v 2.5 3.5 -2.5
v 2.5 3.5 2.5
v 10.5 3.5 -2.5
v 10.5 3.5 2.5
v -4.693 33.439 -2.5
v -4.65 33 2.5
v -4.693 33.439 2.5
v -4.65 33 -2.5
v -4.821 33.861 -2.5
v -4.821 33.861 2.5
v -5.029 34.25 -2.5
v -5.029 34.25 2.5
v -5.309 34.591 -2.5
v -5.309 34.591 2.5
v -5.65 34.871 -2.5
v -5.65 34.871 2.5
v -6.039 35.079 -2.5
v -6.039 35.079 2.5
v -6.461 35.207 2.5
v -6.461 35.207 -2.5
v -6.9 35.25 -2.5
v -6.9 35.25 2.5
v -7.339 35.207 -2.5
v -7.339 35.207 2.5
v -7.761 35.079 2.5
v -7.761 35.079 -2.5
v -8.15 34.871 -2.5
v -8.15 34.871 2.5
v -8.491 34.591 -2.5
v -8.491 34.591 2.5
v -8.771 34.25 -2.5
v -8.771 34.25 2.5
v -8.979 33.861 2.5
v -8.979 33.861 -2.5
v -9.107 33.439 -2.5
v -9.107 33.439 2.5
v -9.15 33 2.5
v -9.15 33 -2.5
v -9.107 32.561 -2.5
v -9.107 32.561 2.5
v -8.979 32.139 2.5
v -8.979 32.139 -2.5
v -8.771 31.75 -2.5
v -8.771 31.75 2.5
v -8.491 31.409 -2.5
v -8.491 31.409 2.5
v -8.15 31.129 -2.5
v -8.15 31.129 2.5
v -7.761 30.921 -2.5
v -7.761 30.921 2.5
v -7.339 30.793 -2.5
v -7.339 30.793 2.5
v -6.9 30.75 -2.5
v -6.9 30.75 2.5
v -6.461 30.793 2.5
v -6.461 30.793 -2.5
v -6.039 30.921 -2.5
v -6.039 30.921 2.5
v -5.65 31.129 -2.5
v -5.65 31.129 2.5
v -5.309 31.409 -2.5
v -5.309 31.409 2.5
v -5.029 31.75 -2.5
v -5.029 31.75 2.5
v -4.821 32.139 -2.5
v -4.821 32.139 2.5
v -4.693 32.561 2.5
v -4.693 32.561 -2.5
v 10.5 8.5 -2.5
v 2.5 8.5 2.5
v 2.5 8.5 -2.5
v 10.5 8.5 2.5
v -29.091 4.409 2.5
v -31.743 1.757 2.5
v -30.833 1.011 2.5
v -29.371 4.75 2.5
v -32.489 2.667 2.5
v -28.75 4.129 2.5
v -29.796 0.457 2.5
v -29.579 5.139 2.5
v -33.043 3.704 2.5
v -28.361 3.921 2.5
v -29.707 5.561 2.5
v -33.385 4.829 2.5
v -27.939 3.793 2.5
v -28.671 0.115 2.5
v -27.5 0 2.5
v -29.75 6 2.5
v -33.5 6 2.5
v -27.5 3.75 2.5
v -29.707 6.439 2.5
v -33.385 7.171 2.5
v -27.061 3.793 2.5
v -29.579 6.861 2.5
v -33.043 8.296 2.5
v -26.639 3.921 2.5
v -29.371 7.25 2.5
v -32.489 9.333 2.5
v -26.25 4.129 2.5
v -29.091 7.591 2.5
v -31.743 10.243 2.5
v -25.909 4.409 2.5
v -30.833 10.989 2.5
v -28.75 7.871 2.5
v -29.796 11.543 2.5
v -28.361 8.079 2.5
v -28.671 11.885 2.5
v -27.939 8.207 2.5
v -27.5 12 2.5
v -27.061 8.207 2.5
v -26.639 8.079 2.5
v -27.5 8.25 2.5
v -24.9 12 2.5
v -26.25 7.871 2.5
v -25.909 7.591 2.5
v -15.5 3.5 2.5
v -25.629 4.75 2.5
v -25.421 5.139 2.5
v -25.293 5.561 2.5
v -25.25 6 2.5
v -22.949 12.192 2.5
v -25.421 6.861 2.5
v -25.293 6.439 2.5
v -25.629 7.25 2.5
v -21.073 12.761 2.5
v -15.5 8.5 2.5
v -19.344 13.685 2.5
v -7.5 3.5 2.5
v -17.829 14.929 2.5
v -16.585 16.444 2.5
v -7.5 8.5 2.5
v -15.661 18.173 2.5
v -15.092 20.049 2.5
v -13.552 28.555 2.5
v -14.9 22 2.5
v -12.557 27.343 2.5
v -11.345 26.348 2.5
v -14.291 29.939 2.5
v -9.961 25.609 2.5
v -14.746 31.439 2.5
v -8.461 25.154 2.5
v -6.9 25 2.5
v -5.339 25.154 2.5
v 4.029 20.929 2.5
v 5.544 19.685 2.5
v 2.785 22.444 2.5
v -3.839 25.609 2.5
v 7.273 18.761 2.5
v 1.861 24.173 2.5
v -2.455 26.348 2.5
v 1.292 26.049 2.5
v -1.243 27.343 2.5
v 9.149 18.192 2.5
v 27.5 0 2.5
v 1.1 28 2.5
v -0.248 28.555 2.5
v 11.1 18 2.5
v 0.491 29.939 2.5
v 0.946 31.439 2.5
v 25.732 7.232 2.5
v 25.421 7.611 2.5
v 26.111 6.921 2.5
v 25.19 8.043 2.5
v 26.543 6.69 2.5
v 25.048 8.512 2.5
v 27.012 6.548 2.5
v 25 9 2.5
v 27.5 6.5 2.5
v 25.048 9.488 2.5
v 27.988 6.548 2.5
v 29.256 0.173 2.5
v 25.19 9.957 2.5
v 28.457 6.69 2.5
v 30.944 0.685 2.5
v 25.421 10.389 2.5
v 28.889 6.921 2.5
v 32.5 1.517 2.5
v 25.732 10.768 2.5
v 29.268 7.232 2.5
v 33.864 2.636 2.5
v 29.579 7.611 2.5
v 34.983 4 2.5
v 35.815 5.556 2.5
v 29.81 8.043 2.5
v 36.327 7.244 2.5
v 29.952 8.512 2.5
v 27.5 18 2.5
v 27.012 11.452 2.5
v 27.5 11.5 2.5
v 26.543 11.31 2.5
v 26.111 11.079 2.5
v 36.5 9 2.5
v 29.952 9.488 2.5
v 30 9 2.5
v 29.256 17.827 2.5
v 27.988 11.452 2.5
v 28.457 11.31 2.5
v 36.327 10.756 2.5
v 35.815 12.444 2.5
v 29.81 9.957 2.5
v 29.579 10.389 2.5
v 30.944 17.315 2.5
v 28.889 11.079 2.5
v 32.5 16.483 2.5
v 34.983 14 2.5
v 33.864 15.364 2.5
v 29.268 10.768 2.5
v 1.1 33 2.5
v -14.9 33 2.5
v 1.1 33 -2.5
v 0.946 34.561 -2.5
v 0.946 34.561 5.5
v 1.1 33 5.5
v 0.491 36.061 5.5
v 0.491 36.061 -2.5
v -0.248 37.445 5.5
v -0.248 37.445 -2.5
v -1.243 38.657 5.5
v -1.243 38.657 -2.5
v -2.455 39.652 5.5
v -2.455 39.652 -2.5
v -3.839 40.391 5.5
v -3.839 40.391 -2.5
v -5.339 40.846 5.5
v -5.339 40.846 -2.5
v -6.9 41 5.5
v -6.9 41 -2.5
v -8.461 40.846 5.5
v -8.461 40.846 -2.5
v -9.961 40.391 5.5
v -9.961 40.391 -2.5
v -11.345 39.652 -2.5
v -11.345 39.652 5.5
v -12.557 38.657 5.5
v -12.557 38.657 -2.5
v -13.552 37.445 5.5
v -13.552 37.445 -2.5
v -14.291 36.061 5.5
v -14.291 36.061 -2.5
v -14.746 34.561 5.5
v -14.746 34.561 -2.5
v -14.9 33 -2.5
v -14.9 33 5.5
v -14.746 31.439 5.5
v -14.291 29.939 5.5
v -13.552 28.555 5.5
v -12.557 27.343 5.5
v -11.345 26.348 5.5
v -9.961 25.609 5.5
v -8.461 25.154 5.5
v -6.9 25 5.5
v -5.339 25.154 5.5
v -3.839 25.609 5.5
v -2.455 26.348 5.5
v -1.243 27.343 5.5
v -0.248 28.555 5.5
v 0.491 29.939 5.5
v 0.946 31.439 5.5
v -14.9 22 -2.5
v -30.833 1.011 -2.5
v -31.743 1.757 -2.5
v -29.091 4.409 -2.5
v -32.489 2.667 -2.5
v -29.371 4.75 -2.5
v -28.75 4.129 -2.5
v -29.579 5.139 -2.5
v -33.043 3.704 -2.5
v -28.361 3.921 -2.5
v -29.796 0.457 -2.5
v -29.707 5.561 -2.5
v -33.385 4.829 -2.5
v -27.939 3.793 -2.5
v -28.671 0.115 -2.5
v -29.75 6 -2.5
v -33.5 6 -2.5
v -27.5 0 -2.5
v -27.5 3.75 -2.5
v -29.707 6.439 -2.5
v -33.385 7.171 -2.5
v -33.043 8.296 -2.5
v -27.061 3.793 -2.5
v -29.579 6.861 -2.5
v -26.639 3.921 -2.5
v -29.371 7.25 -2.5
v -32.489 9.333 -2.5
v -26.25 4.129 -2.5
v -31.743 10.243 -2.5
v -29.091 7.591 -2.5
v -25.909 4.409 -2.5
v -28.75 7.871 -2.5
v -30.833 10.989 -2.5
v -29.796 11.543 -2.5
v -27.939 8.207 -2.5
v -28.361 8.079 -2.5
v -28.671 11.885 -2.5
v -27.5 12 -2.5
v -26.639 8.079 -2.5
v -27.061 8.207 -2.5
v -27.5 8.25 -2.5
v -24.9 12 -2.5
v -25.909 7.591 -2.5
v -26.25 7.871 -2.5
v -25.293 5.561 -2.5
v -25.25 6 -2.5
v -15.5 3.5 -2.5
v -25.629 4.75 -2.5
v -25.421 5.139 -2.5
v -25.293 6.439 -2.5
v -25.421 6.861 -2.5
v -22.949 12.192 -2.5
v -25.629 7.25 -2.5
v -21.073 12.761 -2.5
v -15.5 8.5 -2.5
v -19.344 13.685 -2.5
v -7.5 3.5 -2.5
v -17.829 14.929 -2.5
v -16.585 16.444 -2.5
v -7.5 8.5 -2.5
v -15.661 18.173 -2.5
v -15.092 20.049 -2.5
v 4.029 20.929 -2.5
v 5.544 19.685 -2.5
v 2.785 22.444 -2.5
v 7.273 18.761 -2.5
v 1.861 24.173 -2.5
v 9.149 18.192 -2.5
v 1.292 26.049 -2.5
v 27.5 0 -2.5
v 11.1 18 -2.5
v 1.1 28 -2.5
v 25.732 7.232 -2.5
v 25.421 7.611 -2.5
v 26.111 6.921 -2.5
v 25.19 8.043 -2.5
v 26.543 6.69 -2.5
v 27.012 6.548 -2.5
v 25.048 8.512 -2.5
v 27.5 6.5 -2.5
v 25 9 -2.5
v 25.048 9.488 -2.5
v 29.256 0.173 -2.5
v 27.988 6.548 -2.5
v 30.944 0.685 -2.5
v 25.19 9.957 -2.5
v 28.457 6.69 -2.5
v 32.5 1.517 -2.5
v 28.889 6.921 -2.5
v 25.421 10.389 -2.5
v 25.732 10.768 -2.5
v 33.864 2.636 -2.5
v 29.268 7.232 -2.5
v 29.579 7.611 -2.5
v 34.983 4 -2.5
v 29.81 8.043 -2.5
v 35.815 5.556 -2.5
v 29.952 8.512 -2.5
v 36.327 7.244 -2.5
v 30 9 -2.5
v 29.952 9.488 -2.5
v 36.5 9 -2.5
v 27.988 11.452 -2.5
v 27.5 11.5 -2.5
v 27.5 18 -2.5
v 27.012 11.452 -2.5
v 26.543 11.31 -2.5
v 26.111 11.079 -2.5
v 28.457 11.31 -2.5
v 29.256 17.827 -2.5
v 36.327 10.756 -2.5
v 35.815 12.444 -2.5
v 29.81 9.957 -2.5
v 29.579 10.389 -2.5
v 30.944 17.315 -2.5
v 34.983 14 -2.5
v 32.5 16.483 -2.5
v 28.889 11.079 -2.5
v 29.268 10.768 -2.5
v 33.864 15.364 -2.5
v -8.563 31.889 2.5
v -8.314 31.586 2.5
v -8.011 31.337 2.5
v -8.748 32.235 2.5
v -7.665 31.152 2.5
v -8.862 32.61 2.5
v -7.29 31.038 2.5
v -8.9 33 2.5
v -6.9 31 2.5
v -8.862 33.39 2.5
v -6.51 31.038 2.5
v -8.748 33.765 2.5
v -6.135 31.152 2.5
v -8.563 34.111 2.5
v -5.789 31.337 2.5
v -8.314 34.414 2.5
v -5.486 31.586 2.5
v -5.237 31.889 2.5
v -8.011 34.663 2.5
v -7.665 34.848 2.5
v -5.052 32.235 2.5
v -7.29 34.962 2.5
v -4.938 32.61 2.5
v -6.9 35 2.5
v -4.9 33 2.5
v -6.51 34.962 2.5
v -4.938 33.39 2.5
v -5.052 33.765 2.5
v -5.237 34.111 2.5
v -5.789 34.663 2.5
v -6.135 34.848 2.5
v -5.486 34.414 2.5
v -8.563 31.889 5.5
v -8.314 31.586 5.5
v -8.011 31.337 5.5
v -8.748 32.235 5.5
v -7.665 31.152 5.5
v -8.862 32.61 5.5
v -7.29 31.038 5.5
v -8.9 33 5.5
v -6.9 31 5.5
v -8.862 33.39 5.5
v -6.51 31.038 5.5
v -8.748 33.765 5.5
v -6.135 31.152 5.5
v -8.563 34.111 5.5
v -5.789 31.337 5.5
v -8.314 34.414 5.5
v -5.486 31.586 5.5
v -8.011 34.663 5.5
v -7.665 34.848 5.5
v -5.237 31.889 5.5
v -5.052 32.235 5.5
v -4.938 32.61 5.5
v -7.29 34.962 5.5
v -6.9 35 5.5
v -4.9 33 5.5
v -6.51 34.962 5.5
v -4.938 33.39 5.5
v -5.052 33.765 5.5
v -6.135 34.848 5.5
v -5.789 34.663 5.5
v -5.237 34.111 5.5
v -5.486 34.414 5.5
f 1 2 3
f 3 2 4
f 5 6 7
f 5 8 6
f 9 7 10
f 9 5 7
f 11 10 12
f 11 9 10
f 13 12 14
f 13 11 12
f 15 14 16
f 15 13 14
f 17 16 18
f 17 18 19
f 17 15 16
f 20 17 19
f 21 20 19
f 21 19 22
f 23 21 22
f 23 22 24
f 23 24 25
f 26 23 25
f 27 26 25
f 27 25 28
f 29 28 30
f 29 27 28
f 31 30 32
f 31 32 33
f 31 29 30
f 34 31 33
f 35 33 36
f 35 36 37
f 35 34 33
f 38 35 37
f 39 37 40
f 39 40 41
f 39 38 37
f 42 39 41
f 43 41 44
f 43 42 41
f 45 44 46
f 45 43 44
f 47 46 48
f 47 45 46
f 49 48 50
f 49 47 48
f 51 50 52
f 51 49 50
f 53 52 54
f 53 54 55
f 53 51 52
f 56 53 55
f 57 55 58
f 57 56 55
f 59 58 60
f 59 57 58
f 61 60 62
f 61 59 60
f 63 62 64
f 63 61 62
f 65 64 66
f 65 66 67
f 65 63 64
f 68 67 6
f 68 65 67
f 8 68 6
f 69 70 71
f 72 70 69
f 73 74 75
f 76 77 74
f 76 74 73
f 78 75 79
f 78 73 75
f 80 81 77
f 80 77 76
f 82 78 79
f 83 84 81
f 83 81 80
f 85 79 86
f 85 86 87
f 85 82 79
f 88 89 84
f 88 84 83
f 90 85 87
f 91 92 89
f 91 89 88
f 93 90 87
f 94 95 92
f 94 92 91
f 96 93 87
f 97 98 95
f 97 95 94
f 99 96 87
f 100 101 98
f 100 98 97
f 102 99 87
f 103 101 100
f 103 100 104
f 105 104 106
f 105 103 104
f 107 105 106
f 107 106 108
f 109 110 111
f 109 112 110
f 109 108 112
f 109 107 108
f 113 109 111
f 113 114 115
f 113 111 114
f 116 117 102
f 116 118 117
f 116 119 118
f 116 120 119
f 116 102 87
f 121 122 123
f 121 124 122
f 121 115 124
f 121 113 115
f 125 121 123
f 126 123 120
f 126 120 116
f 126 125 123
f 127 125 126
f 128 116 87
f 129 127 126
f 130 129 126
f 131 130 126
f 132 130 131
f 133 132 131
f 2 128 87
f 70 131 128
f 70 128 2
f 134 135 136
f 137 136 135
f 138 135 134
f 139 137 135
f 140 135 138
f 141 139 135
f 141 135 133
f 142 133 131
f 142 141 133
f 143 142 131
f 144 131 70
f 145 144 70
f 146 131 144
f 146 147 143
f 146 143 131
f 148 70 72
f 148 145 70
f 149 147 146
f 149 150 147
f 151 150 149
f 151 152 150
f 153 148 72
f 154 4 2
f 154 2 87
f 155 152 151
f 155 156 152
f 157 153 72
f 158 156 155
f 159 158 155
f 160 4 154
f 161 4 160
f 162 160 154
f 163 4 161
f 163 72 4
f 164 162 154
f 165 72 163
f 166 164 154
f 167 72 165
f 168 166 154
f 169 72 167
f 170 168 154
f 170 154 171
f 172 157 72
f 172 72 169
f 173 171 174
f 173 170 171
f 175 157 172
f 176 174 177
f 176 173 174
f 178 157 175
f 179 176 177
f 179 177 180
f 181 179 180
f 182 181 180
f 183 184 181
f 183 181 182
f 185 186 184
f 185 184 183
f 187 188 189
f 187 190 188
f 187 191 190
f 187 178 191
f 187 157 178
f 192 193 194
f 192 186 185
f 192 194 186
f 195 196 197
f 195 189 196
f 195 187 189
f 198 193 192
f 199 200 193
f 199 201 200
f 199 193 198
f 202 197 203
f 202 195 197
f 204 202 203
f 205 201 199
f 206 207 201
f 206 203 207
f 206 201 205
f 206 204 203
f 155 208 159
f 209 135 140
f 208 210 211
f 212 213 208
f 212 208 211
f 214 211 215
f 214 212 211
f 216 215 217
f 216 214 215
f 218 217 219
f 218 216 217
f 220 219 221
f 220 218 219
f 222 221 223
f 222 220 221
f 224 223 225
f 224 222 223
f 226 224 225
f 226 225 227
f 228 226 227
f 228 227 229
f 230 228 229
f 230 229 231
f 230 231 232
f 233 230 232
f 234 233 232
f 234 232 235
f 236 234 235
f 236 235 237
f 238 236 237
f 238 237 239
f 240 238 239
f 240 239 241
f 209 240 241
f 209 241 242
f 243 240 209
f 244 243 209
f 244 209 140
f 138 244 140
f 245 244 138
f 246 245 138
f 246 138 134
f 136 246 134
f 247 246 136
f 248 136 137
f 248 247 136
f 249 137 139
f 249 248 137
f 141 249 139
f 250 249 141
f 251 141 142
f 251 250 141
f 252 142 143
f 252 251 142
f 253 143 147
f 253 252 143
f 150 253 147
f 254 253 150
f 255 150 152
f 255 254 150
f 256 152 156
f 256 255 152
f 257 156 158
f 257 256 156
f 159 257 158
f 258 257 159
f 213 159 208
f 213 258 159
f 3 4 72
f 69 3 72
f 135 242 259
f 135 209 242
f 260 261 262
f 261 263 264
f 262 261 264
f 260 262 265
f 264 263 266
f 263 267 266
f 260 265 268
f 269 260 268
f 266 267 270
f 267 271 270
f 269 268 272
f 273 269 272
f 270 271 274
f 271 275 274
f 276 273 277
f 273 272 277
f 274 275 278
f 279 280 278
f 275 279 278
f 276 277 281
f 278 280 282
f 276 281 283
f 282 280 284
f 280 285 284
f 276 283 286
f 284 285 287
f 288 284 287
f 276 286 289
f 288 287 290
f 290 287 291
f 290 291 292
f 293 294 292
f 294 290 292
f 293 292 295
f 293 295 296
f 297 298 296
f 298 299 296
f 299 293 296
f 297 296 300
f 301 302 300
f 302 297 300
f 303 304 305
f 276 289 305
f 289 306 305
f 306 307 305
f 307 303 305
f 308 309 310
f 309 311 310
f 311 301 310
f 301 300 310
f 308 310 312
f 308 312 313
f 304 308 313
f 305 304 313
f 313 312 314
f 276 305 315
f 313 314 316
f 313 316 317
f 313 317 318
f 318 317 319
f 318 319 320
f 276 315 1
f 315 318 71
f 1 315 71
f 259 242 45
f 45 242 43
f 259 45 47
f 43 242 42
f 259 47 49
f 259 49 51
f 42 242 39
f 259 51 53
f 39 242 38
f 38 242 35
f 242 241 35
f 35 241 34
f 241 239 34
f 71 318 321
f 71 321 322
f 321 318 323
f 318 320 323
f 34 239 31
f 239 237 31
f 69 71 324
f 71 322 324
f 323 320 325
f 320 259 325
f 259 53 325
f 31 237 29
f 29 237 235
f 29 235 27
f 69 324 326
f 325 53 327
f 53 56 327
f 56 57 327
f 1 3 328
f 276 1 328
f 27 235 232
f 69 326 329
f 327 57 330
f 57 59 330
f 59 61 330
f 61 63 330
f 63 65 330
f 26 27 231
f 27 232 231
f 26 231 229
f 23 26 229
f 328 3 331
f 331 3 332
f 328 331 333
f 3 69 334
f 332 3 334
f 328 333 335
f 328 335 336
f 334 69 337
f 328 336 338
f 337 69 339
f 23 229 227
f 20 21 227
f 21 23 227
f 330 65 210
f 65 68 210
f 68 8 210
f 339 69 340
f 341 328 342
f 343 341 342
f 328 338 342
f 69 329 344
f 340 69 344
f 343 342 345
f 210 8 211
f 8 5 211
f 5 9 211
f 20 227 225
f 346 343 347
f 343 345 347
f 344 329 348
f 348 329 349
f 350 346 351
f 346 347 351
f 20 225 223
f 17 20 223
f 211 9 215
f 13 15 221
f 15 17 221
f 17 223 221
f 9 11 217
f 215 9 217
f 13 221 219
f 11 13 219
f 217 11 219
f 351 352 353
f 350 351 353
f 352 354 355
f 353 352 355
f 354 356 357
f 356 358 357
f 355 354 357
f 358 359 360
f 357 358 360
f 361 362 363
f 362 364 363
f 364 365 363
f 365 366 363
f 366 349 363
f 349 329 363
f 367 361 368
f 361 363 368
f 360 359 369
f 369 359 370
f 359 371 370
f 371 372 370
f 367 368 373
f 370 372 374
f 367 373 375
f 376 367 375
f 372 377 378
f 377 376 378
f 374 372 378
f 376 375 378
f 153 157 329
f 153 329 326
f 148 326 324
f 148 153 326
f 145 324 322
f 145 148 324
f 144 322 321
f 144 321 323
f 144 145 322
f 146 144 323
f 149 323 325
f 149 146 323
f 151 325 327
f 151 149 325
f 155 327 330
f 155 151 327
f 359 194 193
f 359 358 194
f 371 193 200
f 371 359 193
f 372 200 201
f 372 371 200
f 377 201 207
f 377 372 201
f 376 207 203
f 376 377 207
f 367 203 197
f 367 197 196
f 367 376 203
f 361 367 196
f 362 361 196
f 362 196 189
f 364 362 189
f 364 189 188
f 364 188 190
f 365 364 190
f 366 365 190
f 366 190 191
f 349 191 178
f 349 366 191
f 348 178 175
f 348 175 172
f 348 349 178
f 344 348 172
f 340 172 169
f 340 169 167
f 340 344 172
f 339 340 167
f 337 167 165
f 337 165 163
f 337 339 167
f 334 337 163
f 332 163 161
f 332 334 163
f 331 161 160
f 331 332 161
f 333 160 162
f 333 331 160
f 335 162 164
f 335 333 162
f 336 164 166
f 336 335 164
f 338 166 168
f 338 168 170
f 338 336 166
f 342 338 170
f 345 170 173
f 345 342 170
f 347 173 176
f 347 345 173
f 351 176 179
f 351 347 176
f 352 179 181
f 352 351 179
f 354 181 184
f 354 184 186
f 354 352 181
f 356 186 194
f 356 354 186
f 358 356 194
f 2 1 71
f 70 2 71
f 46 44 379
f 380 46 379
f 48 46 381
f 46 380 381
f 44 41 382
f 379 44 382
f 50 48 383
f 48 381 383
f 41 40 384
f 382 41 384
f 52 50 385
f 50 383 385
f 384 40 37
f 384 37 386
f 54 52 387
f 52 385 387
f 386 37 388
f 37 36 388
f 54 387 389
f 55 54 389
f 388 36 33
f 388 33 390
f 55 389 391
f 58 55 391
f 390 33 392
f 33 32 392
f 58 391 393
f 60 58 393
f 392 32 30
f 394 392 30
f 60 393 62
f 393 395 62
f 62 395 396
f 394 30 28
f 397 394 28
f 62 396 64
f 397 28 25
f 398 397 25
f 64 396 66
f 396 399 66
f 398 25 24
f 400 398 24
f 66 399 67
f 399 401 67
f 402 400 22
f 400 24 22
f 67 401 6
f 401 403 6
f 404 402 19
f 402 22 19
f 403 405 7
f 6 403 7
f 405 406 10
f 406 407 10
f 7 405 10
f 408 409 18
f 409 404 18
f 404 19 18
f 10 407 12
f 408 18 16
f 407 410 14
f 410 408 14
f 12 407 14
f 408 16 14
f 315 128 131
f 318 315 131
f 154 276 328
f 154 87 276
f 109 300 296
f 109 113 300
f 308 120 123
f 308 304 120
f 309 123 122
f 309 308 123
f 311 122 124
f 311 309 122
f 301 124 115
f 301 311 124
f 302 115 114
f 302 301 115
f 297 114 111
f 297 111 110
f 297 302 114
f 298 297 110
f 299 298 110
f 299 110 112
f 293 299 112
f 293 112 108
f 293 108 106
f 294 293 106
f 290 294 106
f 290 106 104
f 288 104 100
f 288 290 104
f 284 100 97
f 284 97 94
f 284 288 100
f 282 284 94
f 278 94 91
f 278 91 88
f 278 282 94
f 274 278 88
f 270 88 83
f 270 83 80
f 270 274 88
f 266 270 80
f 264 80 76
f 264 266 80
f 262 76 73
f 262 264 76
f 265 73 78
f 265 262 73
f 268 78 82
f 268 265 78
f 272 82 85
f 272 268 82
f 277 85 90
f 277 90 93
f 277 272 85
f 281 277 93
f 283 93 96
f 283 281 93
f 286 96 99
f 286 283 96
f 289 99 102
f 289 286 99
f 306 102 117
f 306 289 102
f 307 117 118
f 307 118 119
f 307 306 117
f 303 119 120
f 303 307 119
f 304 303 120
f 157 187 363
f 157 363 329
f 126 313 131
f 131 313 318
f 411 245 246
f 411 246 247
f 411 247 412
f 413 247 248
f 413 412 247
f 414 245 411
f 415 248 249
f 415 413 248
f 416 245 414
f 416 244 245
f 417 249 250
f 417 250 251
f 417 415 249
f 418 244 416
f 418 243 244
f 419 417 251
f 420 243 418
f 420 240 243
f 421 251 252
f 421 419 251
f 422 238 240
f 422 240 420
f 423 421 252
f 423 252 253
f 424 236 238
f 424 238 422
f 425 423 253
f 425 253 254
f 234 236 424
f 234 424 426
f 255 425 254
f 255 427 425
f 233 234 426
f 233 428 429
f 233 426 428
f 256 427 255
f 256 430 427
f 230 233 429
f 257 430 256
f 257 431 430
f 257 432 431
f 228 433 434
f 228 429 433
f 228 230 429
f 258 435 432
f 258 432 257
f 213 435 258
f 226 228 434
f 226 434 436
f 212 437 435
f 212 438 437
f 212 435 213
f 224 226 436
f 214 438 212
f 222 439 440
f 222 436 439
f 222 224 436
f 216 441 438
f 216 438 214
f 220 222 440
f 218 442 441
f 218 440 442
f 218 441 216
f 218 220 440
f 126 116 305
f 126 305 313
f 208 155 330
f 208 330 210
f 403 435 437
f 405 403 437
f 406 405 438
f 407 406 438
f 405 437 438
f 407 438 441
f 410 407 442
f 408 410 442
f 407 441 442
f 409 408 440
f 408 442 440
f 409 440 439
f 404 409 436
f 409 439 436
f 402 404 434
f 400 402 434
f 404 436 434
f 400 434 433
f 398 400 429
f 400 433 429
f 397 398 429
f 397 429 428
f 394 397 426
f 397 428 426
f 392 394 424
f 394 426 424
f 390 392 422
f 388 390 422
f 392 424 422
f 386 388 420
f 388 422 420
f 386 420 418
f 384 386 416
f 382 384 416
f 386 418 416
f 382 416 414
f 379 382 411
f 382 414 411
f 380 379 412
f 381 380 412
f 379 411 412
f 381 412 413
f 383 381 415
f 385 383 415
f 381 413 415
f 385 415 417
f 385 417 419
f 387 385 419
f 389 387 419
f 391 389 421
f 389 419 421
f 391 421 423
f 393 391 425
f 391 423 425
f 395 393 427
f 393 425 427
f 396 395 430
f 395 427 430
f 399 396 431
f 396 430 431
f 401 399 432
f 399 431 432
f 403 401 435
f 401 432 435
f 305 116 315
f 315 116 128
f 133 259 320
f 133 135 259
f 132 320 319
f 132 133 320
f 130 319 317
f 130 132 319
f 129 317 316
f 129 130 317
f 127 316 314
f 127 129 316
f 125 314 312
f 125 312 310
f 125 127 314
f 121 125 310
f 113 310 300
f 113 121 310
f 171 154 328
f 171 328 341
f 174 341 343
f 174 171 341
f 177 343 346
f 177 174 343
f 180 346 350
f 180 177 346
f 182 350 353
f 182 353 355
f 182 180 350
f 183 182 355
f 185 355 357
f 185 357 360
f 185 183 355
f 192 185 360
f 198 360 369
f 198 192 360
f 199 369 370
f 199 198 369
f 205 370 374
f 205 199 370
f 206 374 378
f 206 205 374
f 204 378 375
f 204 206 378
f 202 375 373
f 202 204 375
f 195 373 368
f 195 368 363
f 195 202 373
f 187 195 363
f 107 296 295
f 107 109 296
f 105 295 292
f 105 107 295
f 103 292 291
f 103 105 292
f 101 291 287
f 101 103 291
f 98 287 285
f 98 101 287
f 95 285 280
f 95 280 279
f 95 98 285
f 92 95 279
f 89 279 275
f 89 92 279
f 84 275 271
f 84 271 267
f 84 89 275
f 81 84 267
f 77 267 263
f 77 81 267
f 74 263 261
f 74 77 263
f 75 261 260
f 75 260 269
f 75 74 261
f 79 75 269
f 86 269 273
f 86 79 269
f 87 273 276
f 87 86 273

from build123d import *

# Parameters (mm, degrees)
SKETCH1_R           = 2.5
SKETCH1_R_2         = 2.25
SKETCH1_W           = 8
SKETCH1_H           = 5
BOSS_EXTRUDE1_DEPTH = 2.5
EXTRUDE_START       = 3
SKETCH_2_R          = 8
SKETCH_2_R_2        = 2
EXTRUDE_1_DEPTH     = 3


with BuildPart() as part:
    # Sketch1 → Boss-Extrude1 (new, symmetric)
    with BuildSketch(Plane.XY):
        with BuildLine():
            Line((-27.5, 0), (27.5, 0))
            ThreePointArc((27.5, 0), (36.5, 9), (27.5, 18))
            Line((27.5, 18), (11.1, 18))
            ThreePointArc((11.1, 18), (4.028932188, 20.928932188), (1.1, 28))
            Line((1.1, 28), (1.1, 33))
            ThreePointArc((1.1, 33), (-6.9, 41), (-14.9, 33))
            Line((-14.9, 33), (-14.9, 22))
            ThreePointArc((-14.9, 22), (-17.828932188, 14.928932188), (-24.9, 12))
            Line((-24.9, 12), (-27.5, 12))
            ThreePointArc((-27.5, 12), (-33.5, 6), (-27.5, 0))
        make_face()
        with Locations((27.5, 9)):
            Circle(SKETCH1_R, mode=Mode.SUBTRACT)
        with Locations((-27.5, 6)):
            Circle(SKETCH1_R_2, mode=Mode.SUBTRACT)
        with Locations((-6.9, 33)):
            Circle(SKETCH1_R_2, mode=Mode.SUBTRACT)
        with Locations((-11.5, 6)):
            Rectangle(SKETCH1_W, SKETCH1_H, mode=Mode.SUBTRACT)
        with Locations((6.5, 6)):
            Rectangle(SKETCH1_W, SKETCH1_H, mode=Mode.SUBTRACT)
    extrude(amount=BOSS_EXTRUDE1_DEPTH, both=True)

    # 草图2 → 凸台-拉伸1 (add)
    with BuildSketch(Plane.XY.offset(2.5).offset(EXTRUDE_START)):
        with Locations((-6.9, 33)):
            Circle(SKETCH_2_R)
        with Locations((-6.9, 33)):
            Circle(SKETCH_2_R_2, mode=Mode.SUBTRACT)
    extrude(amount=-EXTRUDE_1_DEPTH)


solid = part.part
